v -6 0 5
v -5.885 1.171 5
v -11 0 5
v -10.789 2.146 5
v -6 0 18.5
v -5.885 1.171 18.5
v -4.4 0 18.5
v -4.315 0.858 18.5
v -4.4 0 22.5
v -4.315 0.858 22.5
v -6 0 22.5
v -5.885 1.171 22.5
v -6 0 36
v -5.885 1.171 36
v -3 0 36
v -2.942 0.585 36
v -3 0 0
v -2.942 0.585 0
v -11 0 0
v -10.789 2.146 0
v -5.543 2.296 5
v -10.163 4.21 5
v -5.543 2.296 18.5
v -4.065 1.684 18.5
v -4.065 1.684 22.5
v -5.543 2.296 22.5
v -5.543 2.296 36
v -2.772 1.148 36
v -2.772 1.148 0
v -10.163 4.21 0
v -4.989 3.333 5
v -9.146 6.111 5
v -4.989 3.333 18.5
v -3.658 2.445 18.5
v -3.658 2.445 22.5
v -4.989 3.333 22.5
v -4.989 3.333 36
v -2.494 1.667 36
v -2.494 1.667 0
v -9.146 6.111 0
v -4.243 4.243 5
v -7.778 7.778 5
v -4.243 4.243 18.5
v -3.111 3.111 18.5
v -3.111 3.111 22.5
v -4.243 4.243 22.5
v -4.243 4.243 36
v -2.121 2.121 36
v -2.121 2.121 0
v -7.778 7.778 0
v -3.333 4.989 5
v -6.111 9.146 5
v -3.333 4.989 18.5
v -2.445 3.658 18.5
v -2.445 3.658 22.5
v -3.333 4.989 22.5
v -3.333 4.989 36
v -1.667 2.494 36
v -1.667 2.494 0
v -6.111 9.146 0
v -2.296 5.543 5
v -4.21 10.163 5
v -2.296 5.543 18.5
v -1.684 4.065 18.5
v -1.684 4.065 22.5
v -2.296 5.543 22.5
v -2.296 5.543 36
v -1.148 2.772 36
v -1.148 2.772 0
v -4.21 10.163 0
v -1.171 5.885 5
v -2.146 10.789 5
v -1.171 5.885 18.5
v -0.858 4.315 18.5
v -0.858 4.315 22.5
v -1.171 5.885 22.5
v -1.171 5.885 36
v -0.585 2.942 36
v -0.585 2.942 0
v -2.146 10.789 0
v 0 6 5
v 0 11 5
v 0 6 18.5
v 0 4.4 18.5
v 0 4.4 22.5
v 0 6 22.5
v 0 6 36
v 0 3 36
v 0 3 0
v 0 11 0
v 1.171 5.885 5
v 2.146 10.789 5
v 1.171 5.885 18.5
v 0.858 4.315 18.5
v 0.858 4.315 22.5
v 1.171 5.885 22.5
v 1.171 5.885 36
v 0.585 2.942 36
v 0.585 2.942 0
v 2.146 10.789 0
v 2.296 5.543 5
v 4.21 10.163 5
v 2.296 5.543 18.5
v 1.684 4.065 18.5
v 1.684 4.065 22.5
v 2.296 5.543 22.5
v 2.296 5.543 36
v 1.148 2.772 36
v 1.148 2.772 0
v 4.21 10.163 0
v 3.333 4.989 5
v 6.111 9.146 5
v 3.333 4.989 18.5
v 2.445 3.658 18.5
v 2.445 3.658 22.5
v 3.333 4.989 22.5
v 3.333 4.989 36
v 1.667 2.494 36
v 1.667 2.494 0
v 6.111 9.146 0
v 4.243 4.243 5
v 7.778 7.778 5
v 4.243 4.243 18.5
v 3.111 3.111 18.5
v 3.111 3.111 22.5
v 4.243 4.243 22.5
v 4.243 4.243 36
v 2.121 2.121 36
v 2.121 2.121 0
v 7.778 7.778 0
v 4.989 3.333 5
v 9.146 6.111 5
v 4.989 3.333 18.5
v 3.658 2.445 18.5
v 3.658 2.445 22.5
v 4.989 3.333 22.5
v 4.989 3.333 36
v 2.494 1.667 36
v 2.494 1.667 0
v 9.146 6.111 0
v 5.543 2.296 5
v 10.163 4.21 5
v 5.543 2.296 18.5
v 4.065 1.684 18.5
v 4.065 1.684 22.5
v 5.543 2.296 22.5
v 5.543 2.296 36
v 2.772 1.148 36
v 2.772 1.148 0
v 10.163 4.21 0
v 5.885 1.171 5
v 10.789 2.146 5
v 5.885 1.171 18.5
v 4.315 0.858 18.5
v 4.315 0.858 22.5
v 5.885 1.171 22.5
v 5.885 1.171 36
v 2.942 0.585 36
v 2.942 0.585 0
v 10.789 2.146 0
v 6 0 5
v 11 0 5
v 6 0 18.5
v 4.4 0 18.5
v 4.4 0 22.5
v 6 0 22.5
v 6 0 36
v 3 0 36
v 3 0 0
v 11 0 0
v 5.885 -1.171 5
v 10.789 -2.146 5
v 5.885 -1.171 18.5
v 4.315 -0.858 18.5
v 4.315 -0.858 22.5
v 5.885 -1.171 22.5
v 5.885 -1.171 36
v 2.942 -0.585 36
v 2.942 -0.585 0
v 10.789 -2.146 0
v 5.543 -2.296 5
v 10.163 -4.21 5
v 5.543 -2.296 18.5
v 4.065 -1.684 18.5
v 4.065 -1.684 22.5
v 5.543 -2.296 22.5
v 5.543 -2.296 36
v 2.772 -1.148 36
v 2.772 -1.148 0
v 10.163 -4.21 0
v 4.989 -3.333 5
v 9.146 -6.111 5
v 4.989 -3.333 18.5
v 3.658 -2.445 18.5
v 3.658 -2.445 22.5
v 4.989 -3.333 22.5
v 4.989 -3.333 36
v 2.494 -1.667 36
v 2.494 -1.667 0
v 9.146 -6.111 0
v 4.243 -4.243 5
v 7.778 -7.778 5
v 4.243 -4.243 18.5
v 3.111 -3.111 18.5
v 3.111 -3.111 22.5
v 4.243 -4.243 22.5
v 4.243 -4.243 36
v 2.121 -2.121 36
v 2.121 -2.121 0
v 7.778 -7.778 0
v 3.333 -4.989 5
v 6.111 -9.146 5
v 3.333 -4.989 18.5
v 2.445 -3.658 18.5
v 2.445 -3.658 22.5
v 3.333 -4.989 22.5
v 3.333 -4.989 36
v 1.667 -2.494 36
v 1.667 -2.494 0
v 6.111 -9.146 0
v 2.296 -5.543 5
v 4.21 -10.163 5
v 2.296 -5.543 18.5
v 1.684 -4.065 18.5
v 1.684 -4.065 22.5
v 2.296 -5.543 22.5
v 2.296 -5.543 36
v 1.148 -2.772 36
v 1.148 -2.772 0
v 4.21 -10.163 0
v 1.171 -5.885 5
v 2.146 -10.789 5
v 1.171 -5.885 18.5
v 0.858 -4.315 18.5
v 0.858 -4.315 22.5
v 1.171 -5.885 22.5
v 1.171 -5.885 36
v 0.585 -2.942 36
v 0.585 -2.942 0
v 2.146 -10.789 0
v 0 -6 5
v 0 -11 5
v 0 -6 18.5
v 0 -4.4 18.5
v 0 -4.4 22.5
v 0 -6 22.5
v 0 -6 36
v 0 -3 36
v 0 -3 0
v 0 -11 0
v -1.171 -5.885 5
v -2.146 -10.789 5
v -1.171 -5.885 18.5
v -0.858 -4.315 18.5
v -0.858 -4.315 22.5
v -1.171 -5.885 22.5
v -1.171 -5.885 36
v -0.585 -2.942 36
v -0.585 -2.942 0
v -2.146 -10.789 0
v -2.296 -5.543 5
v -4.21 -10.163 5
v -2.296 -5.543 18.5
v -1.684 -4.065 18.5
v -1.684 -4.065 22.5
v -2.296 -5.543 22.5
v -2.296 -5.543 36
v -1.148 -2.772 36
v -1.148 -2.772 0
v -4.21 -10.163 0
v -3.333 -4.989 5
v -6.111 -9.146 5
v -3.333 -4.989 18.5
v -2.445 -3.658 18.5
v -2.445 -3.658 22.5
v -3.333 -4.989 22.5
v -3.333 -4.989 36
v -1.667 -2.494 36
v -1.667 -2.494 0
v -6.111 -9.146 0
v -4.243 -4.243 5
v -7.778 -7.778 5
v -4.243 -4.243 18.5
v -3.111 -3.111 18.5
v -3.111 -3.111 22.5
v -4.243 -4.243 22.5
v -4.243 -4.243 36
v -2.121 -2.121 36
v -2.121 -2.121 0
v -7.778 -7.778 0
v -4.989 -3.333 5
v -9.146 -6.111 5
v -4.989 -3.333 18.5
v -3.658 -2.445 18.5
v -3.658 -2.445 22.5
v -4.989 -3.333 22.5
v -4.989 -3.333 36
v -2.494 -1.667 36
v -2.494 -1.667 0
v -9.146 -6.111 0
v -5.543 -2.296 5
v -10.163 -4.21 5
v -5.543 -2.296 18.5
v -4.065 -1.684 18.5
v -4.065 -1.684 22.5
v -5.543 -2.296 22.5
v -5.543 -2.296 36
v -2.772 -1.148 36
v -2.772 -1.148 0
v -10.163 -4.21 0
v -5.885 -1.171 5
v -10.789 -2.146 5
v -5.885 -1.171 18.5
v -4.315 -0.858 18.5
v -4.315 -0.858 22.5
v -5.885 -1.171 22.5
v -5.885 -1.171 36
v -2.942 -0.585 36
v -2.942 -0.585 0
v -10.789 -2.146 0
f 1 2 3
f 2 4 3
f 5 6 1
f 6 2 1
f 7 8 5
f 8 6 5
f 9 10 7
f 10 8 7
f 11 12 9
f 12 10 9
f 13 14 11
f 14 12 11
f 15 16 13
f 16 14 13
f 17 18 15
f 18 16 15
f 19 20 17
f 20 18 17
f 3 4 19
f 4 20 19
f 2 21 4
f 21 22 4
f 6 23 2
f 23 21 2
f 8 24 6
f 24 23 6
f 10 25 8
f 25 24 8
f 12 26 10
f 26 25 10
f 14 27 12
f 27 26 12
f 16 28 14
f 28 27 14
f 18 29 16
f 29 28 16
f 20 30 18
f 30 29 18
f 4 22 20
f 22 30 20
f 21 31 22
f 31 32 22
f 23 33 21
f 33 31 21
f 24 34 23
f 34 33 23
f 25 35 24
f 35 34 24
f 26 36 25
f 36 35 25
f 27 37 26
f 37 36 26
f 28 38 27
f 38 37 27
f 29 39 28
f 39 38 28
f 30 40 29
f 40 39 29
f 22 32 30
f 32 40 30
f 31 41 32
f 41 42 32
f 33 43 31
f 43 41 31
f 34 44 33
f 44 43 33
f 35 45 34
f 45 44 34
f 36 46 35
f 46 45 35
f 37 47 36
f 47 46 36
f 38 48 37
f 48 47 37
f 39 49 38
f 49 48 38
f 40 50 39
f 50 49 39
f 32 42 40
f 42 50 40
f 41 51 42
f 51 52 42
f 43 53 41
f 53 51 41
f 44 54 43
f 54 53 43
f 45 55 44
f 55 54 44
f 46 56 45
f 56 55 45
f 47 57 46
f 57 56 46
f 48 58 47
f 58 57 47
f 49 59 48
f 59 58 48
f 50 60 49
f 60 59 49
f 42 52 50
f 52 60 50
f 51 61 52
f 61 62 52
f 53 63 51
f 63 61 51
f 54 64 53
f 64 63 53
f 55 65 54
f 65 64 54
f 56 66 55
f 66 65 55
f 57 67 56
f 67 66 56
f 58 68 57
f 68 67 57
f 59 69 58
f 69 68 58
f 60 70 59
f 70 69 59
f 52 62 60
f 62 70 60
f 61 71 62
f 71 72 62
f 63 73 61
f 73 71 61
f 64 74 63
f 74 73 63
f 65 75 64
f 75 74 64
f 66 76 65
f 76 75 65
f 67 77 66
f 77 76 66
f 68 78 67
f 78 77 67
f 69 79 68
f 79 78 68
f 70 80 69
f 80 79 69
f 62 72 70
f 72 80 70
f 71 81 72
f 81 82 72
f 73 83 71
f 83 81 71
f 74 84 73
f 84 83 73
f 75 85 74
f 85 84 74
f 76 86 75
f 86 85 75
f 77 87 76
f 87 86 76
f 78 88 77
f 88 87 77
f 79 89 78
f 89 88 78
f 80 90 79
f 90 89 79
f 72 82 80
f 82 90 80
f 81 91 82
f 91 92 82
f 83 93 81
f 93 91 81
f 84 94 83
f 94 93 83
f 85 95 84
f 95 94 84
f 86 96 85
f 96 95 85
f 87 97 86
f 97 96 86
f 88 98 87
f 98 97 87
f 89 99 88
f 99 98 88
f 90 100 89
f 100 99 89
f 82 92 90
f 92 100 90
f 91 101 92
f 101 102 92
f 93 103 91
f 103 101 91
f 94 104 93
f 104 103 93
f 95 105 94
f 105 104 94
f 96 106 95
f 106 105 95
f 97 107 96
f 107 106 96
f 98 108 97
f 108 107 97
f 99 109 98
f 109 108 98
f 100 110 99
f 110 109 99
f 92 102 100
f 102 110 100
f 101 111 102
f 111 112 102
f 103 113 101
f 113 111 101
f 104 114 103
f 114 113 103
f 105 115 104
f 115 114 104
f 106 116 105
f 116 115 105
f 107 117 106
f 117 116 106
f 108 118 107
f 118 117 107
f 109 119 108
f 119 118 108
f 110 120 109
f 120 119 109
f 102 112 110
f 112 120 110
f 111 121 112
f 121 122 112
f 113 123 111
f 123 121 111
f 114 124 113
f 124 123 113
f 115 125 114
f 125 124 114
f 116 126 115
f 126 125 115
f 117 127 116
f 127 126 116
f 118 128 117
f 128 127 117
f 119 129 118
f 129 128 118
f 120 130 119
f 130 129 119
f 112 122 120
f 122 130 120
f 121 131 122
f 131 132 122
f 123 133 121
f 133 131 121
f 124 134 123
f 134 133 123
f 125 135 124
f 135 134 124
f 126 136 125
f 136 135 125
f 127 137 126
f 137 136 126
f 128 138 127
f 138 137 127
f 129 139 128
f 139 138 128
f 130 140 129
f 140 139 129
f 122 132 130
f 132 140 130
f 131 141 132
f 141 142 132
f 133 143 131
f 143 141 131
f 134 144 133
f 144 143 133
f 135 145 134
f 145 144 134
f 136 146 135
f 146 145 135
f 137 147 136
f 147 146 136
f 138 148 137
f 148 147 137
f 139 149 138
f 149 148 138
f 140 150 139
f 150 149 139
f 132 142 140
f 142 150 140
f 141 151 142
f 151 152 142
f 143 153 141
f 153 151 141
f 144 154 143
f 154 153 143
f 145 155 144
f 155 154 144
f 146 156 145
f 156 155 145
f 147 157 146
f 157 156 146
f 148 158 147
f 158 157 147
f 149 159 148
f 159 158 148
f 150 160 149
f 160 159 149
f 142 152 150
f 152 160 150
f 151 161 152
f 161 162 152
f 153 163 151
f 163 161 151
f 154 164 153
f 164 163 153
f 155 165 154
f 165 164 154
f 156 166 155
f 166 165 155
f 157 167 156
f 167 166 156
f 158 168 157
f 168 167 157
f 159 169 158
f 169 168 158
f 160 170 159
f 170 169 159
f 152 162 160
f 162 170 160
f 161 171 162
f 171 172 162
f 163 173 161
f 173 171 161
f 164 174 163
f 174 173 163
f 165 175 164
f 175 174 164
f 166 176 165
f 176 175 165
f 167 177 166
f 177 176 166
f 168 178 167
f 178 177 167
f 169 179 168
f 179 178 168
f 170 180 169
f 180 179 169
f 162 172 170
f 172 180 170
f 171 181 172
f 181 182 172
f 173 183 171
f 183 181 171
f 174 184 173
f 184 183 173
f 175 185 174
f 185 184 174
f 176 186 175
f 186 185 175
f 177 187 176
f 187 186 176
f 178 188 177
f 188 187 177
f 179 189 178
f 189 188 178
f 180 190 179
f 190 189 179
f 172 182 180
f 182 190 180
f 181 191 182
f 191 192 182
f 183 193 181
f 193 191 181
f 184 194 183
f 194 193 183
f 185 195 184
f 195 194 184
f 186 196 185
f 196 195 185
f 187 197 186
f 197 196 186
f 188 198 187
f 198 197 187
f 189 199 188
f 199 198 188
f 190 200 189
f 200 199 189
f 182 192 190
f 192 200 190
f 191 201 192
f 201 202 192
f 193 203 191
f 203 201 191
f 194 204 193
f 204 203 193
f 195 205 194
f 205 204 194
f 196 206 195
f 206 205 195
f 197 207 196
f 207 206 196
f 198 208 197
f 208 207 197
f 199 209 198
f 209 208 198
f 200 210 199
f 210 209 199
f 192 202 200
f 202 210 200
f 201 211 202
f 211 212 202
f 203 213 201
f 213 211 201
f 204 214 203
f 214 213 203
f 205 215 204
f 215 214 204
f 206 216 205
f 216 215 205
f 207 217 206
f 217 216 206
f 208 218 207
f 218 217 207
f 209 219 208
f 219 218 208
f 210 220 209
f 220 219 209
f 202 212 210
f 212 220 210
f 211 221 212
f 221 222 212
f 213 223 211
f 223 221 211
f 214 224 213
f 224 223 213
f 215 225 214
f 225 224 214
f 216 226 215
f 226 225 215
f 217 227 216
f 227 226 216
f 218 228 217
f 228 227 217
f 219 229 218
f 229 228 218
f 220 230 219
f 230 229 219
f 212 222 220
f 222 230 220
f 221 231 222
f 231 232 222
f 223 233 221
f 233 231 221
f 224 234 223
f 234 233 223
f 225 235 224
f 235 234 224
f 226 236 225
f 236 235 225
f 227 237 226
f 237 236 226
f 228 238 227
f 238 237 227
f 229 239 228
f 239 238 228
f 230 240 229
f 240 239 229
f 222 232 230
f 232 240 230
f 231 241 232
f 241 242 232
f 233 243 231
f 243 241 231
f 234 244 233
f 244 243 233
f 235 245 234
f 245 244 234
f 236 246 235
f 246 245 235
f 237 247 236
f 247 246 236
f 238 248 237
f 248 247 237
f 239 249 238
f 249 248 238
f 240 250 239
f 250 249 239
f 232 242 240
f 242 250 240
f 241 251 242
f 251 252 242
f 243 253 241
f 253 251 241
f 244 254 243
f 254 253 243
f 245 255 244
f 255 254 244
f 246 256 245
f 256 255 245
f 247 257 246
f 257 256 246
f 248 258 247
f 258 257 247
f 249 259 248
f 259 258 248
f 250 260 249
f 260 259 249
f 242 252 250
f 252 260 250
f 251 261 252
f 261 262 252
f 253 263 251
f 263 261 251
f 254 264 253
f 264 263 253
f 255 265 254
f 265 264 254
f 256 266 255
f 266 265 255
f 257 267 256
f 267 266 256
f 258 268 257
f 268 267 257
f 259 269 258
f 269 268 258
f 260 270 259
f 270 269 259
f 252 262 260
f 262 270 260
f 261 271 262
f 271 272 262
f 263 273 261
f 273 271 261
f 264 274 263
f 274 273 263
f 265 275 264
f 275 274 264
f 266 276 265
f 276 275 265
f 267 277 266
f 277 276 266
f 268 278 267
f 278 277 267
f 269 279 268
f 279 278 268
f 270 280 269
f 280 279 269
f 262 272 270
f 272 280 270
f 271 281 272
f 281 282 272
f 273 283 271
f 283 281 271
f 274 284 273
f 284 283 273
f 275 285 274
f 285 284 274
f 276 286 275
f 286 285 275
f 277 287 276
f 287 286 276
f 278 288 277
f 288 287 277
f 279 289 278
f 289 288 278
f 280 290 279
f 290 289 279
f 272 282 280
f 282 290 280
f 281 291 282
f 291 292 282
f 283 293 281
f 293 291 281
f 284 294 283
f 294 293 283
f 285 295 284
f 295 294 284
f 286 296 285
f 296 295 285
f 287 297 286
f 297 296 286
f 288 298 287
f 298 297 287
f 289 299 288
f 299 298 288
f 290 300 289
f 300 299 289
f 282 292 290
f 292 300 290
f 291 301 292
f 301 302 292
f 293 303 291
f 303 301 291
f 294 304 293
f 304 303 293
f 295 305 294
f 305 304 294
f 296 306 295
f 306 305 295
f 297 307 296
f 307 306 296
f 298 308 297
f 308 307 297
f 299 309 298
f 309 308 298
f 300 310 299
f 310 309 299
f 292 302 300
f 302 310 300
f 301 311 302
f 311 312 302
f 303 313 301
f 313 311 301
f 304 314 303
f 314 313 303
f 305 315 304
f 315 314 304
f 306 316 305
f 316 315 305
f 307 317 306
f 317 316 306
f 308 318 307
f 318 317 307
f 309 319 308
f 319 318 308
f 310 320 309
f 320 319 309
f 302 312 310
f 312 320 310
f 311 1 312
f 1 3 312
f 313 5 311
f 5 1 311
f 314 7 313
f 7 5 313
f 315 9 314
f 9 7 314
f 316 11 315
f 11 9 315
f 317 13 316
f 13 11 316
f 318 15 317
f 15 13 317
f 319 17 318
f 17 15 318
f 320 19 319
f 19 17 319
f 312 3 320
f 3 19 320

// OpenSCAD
$fn = 32;

// ----------------------------------------------------------------------
// Grooved revolve: flanged, bore R3
// ----------------------------------------------------------------------

// --- parameters (mm) ---
bore_r = 3;               // bore radius
outer_r = 6;              // outer radius of the body
total_h = 36;             // overall height, Z
wall = 3;                 // radial wall thickness
groove_w = 4;             // groove width
groove_d = 1.6;           // groove depth
grooves = 1;              // number of outer grooves
flange_r = 11;            // flange radius
flange_h = 5;             // flange height

bbox_x = 2 * flange_r;  // full diameter
bore_d = 2 * bore_r;  // bore diameter
body_d = 2 * outer_r;  // body diameter
flange_d = 2 * flange_r;  // flange diameter
revolve_angle = 360;  // full turn around the Z axis

profile = [[3, 0], [6, 0], [11, 0], [11, 5], [6, 5], [6, 18.5], [4.4, 18.5], [4.4, 22.5], [6, 22.5], [6, 36], [3, 36]];  // primary outline, 11 points, counter clockwise

// --- the one profile operation ---
rotate_extrude(angle = revolve_angle) polygon(points = profile);
